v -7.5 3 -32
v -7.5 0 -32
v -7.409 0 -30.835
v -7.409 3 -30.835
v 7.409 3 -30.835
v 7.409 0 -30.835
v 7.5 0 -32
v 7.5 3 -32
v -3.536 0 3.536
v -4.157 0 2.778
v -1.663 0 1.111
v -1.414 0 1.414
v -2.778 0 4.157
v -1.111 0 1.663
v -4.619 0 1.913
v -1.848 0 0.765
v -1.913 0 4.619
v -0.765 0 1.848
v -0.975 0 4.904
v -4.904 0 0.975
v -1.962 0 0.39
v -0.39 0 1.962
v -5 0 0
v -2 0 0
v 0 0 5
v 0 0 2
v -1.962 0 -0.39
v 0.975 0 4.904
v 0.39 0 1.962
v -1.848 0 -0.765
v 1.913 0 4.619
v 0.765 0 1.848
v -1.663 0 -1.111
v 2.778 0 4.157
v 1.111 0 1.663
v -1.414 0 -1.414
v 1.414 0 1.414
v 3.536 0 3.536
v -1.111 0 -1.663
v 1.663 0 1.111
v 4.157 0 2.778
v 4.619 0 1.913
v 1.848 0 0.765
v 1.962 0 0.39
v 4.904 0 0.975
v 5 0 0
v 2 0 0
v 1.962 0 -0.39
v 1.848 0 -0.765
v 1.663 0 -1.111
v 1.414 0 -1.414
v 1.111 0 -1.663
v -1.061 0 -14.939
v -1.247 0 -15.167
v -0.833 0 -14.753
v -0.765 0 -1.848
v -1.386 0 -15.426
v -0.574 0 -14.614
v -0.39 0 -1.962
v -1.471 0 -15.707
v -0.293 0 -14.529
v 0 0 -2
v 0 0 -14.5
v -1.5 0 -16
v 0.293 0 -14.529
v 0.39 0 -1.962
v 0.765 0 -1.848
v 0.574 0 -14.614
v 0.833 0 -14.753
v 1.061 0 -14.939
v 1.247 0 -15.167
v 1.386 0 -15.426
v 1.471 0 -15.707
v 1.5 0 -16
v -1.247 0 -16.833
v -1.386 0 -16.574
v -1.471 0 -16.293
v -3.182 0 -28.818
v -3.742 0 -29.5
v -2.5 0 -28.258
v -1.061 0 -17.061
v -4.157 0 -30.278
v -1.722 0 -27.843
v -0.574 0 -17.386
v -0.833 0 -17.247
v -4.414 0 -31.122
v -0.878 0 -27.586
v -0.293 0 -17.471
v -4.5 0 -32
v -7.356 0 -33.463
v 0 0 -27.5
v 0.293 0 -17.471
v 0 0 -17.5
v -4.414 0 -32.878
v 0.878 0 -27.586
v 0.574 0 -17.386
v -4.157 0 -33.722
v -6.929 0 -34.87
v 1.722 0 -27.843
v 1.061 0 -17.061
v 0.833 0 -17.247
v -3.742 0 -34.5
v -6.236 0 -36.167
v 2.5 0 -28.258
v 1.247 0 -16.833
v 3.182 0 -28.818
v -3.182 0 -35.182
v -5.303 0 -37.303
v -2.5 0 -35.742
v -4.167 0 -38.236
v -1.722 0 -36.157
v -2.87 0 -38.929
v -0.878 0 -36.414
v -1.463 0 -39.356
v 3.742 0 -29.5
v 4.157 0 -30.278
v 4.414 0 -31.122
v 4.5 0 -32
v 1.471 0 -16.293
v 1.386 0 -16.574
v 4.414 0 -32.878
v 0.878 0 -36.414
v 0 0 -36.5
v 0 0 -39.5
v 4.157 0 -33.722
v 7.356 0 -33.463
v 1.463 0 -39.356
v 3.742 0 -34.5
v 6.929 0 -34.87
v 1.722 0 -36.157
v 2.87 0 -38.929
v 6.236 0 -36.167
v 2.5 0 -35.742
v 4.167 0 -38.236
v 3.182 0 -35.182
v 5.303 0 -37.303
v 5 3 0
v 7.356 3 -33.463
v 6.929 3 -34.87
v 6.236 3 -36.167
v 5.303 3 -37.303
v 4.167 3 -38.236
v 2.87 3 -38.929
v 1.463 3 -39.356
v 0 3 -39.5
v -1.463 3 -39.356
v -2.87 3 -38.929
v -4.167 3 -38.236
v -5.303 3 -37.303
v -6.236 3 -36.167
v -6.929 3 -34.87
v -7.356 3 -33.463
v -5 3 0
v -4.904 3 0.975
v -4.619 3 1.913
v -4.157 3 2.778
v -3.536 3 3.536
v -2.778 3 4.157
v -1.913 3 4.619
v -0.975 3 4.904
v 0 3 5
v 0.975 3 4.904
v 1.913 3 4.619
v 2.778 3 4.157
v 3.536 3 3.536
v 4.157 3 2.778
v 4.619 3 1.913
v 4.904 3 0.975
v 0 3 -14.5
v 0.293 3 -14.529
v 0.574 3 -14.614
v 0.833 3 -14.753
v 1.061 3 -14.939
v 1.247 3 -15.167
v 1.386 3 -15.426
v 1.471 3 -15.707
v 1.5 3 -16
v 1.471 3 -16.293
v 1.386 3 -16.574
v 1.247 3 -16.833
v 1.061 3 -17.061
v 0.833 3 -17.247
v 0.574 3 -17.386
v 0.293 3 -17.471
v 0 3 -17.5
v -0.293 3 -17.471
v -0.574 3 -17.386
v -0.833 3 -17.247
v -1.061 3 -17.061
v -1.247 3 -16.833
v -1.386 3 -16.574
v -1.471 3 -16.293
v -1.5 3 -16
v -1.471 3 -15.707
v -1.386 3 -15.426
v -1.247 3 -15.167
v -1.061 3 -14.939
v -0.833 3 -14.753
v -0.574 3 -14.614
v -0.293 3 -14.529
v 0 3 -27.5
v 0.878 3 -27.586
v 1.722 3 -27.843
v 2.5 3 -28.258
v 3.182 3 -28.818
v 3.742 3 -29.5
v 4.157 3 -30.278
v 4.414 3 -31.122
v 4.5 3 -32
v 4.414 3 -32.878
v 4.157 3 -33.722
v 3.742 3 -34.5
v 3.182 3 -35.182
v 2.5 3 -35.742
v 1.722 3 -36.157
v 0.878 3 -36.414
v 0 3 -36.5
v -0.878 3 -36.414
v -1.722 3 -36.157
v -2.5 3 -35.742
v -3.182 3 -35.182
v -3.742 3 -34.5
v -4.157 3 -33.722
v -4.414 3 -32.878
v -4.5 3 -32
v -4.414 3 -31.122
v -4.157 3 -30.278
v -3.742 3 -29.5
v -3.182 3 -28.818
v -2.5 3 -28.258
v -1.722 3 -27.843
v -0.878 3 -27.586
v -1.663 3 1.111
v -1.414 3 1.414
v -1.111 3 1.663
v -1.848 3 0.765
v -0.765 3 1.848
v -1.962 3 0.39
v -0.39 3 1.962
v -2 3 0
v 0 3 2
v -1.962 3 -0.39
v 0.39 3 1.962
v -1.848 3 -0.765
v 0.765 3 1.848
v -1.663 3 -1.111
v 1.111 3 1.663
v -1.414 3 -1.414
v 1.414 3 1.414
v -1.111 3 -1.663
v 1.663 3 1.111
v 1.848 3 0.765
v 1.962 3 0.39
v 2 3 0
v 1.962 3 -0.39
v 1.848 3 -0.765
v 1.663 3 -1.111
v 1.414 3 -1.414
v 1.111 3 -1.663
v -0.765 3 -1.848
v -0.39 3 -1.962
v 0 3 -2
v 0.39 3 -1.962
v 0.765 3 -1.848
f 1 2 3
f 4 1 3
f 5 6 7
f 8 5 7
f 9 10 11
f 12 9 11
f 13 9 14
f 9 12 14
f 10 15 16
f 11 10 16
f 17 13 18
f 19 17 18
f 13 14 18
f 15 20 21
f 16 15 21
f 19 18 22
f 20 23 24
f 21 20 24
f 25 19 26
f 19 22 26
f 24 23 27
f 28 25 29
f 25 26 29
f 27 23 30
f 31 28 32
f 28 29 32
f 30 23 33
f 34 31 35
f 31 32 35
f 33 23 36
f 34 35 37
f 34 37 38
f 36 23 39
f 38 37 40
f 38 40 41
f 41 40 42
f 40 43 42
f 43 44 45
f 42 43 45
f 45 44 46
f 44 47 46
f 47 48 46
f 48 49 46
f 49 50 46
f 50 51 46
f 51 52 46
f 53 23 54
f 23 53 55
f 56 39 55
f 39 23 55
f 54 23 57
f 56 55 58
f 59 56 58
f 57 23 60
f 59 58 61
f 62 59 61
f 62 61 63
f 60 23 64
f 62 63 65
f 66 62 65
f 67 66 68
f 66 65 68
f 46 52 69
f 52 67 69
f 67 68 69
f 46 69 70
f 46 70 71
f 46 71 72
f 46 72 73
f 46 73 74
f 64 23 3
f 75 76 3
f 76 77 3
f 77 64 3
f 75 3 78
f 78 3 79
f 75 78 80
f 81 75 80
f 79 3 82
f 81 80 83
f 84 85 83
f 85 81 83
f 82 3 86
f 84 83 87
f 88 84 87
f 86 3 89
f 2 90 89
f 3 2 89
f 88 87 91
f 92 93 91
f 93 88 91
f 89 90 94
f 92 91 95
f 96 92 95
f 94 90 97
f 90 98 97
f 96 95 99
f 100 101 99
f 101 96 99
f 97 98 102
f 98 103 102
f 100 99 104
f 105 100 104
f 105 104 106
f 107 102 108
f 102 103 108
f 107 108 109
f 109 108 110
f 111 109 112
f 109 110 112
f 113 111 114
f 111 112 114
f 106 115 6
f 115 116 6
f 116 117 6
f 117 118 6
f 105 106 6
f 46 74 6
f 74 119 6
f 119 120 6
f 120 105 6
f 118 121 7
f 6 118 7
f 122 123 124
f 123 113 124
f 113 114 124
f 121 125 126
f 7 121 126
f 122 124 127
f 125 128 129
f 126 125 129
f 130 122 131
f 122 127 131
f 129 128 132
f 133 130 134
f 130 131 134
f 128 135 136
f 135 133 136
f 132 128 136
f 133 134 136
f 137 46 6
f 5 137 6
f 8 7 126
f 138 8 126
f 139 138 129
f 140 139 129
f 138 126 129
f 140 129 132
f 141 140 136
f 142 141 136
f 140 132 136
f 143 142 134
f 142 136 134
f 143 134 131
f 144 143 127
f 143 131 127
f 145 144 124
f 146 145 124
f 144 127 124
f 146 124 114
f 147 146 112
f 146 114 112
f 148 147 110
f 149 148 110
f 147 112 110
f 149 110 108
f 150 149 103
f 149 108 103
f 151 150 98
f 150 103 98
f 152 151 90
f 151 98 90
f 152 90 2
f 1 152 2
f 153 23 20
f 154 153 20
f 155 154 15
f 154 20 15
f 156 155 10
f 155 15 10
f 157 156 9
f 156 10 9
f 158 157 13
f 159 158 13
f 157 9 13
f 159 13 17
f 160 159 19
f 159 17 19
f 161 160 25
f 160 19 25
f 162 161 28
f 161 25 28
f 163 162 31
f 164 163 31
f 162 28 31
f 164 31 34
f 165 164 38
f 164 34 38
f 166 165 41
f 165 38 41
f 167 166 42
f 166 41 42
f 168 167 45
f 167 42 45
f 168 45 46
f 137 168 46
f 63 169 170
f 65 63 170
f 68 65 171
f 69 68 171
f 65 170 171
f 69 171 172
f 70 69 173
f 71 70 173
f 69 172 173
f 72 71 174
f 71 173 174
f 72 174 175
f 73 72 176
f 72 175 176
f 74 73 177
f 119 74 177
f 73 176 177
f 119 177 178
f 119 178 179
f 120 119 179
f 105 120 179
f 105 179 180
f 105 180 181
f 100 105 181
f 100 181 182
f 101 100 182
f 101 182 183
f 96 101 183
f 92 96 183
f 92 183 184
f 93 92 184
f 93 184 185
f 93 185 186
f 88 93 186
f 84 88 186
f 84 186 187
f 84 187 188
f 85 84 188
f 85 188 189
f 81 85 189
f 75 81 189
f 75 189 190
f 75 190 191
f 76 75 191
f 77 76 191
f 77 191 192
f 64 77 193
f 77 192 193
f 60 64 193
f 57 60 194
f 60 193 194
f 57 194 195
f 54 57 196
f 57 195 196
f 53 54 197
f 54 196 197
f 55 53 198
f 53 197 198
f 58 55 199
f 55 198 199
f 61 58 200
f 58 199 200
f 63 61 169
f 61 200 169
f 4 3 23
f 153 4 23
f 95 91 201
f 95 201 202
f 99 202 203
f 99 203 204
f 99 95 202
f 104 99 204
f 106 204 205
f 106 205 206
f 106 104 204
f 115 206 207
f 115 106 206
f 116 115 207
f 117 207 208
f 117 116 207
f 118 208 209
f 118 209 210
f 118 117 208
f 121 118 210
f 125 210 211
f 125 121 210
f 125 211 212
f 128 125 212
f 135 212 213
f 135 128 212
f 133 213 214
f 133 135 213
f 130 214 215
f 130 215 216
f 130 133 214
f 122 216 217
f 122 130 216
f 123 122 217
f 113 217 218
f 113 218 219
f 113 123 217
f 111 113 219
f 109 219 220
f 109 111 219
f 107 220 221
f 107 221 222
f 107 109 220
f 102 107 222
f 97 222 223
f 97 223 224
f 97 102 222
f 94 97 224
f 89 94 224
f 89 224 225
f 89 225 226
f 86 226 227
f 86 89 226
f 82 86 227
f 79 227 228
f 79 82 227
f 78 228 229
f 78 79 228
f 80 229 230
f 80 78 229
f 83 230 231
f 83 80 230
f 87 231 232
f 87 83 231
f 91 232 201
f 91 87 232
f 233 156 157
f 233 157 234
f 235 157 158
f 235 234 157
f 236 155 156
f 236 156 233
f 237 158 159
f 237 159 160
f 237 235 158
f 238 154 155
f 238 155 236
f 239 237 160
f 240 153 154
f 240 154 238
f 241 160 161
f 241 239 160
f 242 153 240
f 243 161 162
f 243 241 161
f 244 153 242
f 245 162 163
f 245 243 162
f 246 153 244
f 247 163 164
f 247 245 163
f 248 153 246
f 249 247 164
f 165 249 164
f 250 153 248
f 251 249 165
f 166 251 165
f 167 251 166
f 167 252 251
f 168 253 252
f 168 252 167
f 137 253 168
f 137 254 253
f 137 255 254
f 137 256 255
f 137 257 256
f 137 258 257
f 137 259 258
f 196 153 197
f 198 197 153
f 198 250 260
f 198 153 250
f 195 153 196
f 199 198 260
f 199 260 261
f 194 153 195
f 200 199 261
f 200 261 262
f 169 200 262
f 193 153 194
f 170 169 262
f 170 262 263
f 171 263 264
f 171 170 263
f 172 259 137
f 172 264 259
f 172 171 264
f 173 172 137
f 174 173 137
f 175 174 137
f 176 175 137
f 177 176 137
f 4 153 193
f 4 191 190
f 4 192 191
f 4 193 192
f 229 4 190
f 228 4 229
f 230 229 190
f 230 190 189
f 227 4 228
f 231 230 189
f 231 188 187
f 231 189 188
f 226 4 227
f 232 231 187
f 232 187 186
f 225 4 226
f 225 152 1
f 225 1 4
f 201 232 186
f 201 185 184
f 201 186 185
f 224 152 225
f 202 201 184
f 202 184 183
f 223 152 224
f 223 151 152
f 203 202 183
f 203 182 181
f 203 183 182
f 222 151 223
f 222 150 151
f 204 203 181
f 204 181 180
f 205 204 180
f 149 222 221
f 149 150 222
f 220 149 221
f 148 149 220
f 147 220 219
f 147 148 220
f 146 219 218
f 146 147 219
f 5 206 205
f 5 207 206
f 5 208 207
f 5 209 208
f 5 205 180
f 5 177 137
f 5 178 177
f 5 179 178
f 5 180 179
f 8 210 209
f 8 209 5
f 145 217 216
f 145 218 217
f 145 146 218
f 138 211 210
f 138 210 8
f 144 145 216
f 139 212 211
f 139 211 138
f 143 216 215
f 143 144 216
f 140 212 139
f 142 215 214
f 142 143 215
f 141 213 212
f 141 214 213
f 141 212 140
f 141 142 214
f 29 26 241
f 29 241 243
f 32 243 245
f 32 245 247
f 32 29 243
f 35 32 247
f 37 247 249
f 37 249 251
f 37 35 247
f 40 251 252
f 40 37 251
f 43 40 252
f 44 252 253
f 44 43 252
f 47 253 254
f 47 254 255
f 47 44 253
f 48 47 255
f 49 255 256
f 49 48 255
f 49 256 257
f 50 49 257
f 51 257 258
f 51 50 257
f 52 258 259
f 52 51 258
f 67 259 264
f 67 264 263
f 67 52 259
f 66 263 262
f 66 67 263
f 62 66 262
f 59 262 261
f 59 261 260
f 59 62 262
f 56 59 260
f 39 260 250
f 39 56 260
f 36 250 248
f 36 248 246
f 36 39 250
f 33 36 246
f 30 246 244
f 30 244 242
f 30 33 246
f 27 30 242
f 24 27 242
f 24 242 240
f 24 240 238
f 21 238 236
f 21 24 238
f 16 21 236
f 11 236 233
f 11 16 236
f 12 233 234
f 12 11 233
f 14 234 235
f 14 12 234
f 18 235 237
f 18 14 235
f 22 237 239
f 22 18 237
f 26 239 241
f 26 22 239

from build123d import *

# Parameters (mm, degrees)
SKETCH_1_R          = 4.5
SKETCH_1_R_2        = 5
SKETCH_1_R_3        = 2
EXTRUDE_1_DEPTH     = 3
SKETCH_2_R          = 1.5
CUT_EXTRUDE_1_DEPTH = 41.317490001


with BuildPart() as part:
    # 草图1 → 凸台-拉伸1 (new body)
    # profile 1 of 3: a face of its own
    with BuildSketch(Plane(origin=(0, 0, 0), x_dir=(1, 0, 0), z_dir=(0, 1, 0))):
        with BuildLine():
            ThreePointArc((7.5, 32), (0, 39.5), (-7.5, 32))
            Line((-7.5, 32), (-7.409002669, 30.835234166))
            ThreePointArc((-7.409002669, 30.835234166), (0, 24.5), (7.409002669, 30.835234166))
            Line((7.409002669, 30.835234166), (7.5, 32))
        make_face()
        with Locations(Location((0, 32, 0), (0, 0, 270))):
            Circle(SKETCH_1_R, mode=Mode.SUBTRACT)
    # profile 2 of 3: a face of its own
    with BuildSketch(Plane(origin=(0, 0, 0), x_dir=(1, 0, 0), z_dir=(0, 1, 0))):
        Circle(SKETCH_1_R_2)
        with Locations(Location((0, 0, 0), (0, 0, 270))):
            Circle(SKETCH_1_R_3, mode=Mode.SUBTRACT)
    # profile 3 of 3: a face of its own
    with BuildSketch(Plane(origin=(0, 0, 0), x_dir=(1, 0, 0), z_dir=(0, 1, 0))):
        with BuildLine():
            ThreePointArc((7.409002669, 30.835234166), (0, 24.5), (-7.409002669, 30.835234166))
            Line((-7.409002669, 30.835234166), (-5, 0))
            ThreePointArc((-5, 0), (0, 5), (5, 0))
            Line((5, 0), (7.409002669, 30.835234166))
        make_face()
    extrude(amount=EXTRUDE_1_DEPTH)

    # 草图2 → 切除-拉伸1 (cut, through all)
    with BuildSketch(Plane(origin=(0, 3, 0), x_dir=(1, 0, 0), z_dir=(0, 1, 0))):
        with Locations(Location((0, 16, 0), (0, 0, 270))):
            Circle(SKETCH_2_R)
    extrude(amount=-CUT_EXTRUDE_1_DEPTH, mode=Mode.SUBTRACT)


solid = part.part
